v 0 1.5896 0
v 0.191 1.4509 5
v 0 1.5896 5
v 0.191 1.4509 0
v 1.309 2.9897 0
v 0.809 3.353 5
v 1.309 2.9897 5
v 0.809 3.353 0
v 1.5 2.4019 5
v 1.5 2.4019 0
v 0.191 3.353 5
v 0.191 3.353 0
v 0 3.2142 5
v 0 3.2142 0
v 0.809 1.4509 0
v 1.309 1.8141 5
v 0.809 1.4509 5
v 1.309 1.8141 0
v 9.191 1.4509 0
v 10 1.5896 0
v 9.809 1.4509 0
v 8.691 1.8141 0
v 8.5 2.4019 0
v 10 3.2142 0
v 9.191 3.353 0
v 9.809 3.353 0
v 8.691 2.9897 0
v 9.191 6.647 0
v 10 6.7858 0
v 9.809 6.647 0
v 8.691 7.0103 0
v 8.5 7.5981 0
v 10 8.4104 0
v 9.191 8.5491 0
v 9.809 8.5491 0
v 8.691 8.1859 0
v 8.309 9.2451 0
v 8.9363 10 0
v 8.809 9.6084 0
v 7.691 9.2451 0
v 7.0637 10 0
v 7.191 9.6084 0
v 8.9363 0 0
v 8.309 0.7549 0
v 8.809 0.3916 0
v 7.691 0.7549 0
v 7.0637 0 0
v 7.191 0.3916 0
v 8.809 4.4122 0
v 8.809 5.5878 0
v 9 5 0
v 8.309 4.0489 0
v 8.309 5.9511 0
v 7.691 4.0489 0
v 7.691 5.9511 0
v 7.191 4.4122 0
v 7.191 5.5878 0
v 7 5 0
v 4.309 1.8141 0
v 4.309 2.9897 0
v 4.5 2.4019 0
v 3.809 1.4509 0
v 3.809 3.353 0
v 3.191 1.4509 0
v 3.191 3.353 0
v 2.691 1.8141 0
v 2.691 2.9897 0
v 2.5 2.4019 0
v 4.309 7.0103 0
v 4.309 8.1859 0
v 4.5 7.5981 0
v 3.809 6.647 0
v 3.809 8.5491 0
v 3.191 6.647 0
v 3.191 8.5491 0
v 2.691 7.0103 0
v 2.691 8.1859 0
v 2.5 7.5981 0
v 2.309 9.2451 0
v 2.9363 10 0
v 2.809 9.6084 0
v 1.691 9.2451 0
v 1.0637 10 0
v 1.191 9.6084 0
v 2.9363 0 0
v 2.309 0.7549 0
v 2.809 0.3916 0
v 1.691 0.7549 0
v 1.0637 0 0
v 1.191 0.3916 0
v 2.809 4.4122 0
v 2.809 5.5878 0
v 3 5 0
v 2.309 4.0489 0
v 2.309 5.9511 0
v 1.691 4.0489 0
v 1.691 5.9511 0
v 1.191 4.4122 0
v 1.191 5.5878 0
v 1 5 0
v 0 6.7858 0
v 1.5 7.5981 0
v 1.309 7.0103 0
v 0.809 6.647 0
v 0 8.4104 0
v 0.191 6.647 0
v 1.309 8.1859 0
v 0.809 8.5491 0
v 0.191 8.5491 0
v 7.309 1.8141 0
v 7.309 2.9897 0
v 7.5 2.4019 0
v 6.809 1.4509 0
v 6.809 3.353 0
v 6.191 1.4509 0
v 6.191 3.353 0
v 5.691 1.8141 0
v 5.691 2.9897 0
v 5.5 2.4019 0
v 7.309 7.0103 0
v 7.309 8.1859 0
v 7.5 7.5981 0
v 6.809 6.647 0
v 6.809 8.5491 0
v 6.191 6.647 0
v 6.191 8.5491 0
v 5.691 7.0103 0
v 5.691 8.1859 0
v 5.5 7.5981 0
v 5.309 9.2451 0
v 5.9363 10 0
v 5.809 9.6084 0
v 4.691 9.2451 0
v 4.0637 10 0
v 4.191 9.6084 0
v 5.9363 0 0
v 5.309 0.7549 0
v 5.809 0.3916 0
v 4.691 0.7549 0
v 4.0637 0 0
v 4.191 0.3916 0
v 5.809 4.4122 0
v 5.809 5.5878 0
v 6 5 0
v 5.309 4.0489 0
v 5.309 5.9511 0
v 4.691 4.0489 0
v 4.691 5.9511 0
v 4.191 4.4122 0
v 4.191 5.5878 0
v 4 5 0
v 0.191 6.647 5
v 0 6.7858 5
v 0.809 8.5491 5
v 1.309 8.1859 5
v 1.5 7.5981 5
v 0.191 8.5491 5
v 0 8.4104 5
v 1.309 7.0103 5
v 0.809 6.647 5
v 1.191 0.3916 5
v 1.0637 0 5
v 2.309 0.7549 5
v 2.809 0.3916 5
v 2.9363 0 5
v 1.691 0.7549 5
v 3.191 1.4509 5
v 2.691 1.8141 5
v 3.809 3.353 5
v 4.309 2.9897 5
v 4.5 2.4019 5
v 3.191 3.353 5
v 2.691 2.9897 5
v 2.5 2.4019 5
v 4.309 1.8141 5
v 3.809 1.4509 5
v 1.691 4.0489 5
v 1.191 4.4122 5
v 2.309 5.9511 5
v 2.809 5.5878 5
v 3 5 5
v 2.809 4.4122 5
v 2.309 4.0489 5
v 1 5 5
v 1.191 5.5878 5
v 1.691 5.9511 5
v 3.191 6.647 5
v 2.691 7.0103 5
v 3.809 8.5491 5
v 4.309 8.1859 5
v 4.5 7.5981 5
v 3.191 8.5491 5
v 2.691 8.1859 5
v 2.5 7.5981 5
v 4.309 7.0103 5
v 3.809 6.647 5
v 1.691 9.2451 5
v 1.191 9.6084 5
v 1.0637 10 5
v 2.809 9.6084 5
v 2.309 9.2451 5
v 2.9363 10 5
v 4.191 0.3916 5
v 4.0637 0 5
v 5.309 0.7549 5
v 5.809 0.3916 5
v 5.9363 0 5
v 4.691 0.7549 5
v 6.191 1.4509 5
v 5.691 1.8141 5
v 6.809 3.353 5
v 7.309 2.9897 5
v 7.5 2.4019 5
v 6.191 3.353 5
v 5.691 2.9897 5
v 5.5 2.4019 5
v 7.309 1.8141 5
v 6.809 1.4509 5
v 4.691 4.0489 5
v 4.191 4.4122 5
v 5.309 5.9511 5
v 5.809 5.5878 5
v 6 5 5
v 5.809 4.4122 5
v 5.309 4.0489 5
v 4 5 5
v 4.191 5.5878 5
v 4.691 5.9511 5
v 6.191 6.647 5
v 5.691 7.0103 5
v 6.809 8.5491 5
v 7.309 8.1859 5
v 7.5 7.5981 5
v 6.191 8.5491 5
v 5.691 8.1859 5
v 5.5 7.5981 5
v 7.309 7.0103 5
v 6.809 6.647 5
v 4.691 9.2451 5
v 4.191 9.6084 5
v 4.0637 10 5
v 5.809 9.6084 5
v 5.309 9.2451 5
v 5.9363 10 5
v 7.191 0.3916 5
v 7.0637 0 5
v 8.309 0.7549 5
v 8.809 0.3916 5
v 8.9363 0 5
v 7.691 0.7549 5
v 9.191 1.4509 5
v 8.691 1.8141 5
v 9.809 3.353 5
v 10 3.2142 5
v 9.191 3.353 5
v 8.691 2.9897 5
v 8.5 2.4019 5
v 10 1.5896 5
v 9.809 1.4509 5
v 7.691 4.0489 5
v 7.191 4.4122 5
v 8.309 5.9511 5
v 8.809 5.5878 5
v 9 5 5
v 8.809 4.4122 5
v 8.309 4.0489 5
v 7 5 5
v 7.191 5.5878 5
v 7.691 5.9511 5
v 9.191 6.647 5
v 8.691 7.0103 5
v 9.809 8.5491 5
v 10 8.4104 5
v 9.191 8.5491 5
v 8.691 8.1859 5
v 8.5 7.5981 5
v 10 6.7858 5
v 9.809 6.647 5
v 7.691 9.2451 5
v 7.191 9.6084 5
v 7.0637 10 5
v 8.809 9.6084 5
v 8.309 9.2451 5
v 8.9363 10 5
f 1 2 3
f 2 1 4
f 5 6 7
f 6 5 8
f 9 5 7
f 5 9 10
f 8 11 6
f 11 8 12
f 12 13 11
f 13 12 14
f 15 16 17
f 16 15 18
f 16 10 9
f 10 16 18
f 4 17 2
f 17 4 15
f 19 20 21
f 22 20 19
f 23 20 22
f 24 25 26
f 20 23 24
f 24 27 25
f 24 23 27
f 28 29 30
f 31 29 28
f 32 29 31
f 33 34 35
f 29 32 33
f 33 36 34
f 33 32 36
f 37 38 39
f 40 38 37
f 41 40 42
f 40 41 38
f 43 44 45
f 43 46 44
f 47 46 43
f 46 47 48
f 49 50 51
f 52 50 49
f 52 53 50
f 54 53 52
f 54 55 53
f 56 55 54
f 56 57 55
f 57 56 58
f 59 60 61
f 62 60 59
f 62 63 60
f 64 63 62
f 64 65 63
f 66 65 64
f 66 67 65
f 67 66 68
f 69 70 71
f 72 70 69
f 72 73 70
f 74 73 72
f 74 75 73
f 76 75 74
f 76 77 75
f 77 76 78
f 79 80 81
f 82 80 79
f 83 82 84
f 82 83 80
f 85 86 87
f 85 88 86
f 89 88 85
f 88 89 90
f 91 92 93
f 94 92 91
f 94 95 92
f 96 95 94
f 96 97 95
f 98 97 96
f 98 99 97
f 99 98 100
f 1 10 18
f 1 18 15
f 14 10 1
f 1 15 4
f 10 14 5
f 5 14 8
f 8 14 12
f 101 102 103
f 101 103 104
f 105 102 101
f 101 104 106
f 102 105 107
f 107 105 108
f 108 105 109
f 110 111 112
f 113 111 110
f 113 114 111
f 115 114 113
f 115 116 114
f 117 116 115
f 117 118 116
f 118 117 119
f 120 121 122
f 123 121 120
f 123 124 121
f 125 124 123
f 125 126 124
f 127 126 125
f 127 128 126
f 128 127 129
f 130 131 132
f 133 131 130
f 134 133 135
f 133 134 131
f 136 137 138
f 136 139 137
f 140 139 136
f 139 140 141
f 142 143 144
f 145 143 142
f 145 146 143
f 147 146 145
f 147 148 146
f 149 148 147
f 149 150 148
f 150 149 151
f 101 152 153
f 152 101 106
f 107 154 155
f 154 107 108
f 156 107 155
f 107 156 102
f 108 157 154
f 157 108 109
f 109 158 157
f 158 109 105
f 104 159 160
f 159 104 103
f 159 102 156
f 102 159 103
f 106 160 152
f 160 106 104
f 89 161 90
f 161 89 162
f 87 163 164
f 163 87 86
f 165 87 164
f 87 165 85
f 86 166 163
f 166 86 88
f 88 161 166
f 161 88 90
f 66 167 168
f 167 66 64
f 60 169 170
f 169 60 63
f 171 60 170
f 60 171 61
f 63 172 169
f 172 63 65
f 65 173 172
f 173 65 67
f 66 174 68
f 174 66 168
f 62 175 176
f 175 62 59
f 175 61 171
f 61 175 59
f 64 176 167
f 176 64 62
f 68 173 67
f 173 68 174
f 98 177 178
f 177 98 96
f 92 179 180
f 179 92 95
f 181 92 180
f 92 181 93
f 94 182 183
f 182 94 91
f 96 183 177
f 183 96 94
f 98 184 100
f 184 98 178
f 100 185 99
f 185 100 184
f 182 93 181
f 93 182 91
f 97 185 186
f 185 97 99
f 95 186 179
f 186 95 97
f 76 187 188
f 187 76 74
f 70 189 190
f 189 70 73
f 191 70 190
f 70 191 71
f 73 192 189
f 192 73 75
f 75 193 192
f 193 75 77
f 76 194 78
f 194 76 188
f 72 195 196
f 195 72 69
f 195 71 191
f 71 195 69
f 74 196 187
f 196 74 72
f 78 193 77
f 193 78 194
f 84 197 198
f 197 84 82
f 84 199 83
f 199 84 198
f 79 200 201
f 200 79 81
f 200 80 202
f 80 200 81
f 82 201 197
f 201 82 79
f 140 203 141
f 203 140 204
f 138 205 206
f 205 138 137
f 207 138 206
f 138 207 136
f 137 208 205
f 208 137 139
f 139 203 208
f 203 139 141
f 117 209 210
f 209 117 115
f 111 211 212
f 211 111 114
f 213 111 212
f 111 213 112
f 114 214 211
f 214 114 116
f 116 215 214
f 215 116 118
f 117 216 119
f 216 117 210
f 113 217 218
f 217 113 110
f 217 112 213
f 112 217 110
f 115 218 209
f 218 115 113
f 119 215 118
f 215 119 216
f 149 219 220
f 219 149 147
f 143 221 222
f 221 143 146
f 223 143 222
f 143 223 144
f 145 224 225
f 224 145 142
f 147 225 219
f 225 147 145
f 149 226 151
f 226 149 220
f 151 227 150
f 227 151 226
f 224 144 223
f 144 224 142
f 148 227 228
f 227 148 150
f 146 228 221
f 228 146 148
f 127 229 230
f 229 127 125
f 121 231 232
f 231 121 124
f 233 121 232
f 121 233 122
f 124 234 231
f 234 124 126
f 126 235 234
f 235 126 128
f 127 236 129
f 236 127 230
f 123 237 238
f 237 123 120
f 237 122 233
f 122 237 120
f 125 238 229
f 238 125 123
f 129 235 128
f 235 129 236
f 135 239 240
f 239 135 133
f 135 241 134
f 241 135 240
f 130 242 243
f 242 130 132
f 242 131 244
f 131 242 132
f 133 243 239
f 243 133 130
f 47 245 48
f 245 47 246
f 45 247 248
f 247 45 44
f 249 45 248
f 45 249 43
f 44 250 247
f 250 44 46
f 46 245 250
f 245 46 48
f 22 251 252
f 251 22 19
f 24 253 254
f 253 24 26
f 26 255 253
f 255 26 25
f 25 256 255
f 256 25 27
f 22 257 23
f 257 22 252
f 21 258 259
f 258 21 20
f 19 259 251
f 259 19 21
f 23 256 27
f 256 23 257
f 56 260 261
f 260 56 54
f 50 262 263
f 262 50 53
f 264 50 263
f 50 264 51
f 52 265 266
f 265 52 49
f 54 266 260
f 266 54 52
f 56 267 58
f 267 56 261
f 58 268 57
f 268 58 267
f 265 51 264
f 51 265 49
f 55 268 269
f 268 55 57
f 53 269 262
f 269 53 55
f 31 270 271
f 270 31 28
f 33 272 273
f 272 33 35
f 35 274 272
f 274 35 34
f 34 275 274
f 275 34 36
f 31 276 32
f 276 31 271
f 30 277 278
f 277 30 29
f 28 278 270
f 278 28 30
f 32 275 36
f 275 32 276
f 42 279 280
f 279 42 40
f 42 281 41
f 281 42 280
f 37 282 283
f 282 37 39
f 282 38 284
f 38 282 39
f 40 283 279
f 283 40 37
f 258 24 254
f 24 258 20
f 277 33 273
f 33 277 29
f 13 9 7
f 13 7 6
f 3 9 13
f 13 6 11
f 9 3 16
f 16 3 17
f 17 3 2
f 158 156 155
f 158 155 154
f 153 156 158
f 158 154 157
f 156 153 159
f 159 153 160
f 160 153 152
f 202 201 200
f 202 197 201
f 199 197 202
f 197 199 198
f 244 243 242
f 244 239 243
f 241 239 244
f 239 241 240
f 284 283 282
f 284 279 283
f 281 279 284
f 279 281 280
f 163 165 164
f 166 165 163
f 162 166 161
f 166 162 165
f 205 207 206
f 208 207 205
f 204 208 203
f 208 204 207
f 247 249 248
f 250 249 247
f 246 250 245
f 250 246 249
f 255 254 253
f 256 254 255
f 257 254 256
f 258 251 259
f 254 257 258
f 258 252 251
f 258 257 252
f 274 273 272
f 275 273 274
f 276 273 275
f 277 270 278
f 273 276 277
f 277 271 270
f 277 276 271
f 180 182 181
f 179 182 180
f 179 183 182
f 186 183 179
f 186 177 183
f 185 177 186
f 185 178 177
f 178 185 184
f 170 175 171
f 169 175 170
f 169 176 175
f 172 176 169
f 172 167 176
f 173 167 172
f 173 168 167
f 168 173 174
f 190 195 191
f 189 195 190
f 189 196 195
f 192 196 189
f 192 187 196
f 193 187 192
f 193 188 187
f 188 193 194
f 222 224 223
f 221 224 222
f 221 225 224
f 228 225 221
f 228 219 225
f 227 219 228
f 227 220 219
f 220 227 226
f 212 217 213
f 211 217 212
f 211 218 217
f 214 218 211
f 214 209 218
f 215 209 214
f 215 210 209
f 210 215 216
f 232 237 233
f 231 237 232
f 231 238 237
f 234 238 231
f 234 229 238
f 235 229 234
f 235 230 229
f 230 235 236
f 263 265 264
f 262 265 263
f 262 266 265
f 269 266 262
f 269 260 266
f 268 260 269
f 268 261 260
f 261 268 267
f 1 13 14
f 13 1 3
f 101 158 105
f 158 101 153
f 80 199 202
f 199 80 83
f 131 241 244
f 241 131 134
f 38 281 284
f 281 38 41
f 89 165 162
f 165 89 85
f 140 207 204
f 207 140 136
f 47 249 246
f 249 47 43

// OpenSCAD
module holefield(holeD, borderW, width, height, depth, fn) {
  // we want to center up the centermost row here...

  rowH = (holeD+borderW)*sin(60);
  pairW = holeD+borderW;

  midX = width/2;
  midY = height/2;

  nX = (ceil(width/pairW)+2);
  nY = (ceil(height/rowH))/2;

  baseX = midX - nX/2*pairW;
  baseY = midY - nY*rowH;
  


  intersection() {
    cube([width, height, depth]);

    translate([baseX, baseY, 0])
      union() {

    for (x = [0:nX]) {
      for (y = [0:nY]) {

    translate([x*pairW, rowH*y*2, 0]) cylinder(r=holeD/2, h=depth+1, $fn=fn);
    translate([x*pairW+pairW/2, rowH*(y*2+1), 0]) cylinder(r=holeD/2, h=depth+1, $fn = fn);
      }
    }


    }
  }


}



    holefield(2, 1, 10, 10,5, 10);
